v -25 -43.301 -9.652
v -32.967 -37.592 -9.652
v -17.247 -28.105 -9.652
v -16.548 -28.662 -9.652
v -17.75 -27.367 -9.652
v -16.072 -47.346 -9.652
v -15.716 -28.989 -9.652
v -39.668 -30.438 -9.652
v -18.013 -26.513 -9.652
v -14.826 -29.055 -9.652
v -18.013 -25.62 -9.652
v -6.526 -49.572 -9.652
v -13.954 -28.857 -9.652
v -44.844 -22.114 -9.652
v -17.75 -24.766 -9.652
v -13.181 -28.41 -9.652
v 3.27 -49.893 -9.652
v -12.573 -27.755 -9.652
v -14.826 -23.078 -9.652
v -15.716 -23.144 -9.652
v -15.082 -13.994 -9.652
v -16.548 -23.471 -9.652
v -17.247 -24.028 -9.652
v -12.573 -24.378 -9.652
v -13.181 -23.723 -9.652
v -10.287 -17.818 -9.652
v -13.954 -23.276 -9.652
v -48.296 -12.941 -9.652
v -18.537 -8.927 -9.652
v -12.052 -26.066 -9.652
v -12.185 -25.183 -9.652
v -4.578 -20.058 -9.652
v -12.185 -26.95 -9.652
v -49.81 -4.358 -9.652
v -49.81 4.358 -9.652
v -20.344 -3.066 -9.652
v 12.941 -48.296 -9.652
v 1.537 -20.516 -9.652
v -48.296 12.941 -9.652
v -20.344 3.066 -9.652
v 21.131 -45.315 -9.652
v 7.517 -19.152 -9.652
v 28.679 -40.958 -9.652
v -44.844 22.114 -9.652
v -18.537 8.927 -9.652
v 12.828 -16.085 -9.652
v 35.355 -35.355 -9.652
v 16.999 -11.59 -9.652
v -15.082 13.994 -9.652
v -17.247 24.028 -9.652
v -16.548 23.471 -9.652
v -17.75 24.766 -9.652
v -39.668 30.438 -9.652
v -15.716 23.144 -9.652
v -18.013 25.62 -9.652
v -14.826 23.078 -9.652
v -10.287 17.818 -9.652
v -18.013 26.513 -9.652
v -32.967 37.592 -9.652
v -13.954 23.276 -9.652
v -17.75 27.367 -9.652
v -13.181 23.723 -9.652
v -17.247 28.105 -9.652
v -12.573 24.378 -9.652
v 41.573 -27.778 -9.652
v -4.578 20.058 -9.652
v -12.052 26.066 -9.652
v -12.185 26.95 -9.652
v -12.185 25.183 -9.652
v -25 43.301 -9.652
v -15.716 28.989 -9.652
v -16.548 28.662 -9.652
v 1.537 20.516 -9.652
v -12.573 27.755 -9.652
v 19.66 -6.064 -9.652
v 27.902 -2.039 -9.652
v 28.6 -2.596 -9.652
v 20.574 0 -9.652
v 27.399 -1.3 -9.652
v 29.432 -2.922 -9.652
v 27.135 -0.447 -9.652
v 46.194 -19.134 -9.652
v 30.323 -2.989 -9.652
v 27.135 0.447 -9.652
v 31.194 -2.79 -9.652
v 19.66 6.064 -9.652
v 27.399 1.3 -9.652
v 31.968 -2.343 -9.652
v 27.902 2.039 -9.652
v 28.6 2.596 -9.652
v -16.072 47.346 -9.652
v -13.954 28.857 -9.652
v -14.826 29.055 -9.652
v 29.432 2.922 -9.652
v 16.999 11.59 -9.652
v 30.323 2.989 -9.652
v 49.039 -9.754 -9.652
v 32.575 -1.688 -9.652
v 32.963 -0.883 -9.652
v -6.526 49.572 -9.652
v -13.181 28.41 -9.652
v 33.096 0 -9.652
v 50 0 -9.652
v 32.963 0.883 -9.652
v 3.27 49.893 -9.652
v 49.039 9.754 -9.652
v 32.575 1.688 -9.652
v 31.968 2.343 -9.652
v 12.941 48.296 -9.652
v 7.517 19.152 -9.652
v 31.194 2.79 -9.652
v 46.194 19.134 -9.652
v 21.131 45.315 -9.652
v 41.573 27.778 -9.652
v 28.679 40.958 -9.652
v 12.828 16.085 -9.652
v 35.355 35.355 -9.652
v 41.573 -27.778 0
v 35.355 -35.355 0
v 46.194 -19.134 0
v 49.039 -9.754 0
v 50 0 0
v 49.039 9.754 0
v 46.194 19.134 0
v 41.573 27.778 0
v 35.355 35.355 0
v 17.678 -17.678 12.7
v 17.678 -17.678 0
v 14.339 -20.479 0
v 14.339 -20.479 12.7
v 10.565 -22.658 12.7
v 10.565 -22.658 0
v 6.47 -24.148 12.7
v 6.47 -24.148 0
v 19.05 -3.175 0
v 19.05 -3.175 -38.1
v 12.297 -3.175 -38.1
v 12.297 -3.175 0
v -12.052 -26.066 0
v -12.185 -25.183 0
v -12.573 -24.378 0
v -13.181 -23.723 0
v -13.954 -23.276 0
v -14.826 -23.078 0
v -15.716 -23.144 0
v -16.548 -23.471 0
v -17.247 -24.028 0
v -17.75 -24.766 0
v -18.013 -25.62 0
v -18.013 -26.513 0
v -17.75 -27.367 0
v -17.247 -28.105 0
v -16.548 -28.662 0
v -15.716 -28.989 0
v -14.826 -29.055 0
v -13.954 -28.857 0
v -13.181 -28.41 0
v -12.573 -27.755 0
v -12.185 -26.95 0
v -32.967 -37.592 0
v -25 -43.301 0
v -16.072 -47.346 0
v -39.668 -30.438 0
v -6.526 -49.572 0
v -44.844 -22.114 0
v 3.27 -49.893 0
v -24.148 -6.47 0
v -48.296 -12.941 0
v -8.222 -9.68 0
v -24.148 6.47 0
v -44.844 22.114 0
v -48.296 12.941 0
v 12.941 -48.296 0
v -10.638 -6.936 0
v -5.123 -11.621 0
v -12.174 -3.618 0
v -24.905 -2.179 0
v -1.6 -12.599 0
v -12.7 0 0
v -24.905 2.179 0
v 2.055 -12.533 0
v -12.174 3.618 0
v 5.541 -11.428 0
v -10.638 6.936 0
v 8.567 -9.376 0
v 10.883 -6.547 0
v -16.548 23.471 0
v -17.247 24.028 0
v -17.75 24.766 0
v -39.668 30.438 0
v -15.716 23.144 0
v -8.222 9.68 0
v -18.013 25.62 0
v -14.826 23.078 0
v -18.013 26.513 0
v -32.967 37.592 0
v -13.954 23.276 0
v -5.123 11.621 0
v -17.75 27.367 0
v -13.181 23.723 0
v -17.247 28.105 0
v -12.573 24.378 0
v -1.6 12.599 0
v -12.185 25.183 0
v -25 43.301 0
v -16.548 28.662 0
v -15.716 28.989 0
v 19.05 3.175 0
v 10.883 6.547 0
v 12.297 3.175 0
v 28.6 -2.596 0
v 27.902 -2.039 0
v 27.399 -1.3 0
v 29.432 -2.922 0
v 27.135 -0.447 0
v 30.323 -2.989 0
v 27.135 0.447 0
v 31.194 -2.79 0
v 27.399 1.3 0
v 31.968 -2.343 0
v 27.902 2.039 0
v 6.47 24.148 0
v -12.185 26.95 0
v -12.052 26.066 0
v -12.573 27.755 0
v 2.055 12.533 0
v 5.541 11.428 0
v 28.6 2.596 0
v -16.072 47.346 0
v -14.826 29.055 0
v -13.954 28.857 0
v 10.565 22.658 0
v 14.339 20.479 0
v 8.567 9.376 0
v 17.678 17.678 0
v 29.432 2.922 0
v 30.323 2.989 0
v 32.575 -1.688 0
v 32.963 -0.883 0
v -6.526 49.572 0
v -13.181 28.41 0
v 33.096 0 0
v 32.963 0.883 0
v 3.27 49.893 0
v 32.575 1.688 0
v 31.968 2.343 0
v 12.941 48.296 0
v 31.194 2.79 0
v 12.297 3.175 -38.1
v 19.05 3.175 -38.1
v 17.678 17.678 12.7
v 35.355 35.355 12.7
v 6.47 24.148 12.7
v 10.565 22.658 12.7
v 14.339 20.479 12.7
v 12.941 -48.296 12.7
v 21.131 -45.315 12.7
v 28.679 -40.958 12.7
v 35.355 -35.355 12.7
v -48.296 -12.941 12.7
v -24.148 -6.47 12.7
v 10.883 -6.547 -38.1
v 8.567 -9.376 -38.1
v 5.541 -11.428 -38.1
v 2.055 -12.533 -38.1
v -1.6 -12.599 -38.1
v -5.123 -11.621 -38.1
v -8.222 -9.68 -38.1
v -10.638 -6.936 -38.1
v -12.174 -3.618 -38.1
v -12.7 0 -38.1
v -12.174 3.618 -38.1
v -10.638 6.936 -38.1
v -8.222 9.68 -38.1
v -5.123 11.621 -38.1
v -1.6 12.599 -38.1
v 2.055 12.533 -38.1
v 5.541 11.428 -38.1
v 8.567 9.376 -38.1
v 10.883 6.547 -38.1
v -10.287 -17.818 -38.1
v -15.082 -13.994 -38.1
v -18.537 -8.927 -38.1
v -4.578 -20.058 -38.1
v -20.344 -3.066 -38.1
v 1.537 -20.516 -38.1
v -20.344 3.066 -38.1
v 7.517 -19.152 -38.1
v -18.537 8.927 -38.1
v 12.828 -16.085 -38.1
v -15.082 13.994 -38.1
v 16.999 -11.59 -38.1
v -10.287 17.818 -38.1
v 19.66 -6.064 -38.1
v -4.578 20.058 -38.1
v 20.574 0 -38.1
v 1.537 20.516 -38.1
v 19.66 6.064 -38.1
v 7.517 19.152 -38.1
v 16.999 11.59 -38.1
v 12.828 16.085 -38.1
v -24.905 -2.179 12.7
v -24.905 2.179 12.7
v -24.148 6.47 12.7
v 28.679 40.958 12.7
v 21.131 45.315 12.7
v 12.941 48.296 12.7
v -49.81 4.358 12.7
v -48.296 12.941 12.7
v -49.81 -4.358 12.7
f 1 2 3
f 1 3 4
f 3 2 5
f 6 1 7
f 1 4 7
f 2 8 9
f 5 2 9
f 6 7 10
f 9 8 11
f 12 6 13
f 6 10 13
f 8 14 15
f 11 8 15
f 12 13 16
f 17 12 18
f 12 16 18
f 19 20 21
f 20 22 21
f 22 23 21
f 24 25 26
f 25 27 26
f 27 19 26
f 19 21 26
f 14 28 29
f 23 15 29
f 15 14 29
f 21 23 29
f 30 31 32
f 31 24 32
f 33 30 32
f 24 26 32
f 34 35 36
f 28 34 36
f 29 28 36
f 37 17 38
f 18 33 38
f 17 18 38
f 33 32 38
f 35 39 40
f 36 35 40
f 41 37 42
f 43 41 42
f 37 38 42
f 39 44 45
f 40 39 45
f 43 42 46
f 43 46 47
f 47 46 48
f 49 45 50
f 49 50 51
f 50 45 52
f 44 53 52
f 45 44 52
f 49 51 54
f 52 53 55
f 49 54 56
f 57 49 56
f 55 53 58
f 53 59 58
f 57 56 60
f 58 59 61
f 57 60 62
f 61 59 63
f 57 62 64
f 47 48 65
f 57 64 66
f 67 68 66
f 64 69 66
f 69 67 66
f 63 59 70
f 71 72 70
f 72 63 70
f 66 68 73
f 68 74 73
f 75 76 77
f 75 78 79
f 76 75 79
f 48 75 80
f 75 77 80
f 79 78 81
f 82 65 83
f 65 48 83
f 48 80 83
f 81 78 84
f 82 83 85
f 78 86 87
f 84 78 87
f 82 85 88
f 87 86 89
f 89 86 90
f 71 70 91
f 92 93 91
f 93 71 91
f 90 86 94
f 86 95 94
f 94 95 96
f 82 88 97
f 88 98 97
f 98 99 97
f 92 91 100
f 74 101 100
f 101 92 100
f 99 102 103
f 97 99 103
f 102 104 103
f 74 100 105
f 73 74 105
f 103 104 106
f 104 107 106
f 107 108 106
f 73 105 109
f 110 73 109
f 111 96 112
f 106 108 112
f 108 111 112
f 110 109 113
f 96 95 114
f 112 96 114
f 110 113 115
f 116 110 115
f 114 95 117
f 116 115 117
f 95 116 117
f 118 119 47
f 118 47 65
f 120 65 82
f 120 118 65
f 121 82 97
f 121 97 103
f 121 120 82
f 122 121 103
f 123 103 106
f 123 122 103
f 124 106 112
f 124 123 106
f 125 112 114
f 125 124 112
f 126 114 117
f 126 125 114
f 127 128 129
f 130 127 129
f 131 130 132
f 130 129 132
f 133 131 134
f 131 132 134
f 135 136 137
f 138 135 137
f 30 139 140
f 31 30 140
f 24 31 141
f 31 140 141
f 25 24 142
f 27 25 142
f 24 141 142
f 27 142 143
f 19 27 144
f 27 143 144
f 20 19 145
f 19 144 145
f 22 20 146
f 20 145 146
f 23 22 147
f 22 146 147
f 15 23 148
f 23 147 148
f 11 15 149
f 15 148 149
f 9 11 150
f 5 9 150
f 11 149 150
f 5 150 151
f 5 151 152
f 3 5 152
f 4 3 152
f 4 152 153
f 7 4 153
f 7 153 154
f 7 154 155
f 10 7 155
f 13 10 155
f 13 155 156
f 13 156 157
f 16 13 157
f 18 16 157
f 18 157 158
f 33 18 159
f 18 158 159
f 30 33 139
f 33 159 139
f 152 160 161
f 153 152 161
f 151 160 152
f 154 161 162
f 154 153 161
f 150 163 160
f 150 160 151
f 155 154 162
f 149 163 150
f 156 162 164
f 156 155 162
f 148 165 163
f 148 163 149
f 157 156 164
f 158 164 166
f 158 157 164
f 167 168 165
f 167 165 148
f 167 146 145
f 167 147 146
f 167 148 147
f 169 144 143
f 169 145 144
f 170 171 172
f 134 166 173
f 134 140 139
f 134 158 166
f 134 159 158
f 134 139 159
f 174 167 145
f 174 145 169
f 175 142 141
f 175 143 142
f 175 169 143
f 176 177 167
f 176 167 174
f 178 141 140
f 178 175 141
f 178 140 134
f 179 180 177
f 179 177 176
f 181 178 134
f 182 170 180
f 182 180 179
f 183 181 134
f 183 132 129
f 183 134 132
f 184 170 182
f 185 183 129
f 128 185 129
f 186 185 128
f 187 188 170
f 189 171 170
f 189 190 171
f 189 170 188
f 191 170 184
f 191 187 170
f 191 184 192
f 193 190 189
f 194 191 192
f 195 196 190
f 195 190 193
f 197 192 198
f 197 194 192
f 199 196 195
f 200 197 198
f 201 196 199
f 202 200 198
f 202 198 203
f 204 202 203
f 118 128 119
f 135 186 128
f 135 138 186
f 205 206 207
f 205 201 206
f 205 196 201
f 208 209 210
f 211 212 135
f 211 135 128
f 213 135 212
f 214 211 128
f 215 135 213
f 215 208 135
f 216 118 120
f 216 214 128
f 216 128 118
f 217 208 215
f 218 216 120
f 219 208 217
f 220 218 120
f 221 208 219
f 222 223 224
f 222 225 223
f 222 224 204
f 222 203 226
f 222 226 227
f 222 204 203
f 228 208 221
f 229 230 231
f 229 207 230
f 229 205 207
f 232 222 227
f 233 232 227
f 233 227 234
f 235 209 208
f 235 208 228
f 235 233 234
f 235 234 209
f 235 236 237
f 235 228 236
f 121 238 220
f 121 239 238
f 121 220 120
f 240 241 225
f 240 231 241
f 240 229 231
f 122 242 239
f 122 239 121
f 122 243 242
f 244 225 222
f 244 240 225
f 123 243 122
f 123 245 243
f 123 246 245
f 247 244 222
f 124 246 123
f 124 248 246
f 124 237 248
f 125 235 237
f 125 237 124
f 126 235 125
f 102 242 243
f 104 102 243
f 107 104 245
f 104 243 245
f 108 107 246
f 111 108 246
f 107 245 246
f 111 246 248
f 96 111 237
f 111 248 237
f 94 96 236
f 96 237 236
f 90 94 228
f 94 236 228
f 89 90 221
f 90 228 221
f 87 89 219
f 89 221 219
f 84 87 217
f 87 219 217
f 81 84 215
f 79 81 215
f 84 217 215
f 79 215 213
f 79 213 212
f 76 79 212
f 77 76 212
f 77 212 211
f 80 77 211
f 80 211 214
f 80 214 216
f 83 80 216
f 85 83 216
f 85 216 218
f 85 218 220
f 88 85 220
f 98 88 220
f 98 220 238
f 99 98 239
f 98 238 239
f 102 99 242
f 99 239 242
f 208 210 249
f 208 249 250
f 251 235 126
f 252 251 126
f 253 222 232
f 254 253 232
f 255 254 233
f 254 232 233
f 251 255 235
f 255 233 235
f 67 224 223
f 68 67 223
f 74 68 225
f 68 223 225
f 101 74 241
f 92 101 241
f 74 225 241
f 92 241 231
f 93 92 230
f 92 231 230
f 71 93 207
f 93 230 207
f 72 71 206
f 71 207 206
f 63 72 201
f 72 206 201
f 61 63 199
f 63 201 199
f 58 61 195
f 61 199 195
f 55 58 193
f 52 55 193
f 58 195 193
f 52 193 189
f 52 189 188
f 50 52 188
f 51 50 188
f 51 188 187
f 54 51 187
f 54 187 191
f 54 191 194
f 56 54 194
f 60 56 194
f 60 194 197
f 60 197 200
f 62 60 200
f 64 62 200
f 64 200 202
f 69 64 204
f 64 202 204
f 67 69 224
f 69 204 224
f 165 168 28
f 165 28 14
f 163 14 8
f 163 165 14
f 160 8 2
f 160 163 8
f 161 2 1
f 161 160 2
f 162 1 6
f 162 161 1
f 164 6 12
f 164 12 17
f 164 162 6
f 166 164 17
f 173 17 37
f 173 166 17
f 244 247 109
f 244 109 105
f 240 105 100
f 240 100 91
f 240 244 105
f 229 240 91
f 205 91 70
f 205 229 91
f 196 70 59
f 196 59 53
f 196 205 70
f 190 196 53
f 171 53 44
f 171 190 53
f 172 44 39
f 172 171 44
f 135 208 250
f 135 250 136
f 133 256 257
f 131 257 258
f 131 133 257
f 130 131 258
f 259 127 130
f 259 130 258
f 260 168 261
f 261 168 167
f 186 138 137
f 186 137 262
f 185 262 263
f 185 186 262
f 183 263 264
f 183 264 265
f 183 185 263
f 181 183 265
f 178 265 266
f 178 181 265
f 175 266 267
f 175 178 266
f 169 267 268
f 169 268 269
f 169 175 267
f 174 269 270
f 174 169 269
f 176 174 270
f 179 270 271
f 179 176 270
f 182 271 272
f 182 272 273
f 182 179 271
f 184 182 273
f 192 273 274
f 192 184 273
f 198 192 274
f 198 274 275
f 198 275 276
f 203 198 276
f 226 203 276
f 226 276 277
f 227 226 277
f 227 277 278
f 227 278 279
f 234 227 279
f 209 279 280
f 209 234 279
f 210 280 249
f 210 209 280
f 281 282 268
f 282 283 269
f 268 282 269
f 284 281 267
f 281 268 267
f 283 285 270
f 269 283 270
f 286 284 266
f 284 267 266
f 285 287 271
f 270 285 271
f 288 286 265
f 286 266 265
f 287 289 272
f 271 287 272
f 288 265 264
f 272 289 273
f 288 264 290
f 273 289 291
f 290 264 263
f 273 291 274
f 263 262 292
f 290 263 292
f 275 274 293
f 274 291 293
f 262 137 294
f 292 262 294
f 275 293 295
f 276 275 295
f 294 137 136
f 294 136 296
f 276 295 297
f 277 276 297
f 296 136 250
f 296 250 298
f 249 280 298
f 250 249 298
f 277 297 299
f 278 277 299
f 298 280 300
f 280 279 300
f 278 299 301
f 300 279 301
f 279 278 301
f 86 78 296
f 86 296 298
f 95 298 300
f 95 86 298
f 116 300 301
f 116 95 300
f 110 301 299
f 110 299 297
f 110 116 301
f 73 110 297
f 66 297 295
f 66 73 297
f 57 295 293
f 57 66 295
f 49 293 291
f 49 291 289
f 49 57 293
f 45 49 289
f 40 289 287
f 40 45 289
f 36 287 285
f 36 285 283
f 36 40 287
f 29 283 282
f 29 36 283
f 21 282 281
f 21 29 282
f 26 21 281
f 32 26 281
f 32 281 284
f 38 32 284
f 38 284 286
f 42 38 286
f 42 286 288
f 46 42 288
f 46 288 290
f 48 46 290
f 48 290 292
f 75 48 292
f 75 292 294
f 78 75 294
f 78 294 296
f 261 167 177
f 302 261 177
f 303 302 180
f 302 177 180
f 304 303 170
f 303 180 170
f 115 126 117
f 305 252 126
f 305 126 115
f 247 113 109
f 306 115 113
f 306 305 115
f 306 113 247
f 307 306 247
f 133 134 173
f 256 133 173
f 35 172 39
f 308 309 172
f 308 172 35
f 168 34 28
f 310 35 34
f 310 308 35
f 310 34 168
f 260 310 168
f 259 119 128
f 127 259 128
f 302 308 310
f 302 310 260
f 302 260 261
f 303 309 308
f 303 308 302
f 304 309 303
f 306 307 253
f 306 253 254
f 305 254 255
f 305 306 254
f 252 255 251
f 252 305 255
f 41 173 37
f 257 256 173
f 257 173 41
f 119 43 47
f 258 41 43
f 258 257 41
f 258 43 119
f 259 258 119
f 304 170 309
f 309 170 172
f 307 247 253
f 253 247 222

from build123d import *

# Parameters (mm, degrees)
F1_DEPTH = 12.7
F0_R     = 2.9972
F0_R_2   = 20.574
F2_DEPTH = 9.652
F3_DEPTH = 9.652
F4_DEPTH = 38.1


with BuildPart() as f1:
    # F0 (on Top) → F1 (new body)
    with BuildSketch(Plane.XY):
        with BuildLine():
            Line((-24.1480973609, 6.4704631866), (-48.2961947219, 12.9409263732))
            ThreePointArc((-48.2961947219, 12.9409263732), (-49.9999, 0), (-48.2961947219, -12.9409263732))
            Line((-48.2961947219, -12.9409263732), (-24.1480973609, -6.4704631866))
            ThreePointArc((-24.1480973609, -6.4704631866), (-24.99995, 0), (-24.1480973609, 6.4704631866))
        make_face()
    extrude(amount=F1_DEPTH)



with BuildPart() as f1b:
    # F0 (on Top) → F1, piece 2 (new body)
    with BuildSketch(Plane.XY):
        with BuildLine():
            Line((17.6776341743, 17.6776341743), (35.3552683486, 35.3552683486))
            ThreePointArc((35.3552683486, 35.3552683486), (24.99995, 43.3011835867), (12.9409263732, 48.2961947219))
            Line((12.9409263732, 48.2961947219), (6.4704631866, 24.1480973609))
            ThreePointArc((6.4704631866, 24.1480973609), (12.499975, 21.6505917933), (17.6776341743, 17.6776341743))
        make_face()
    extrude(amount=F1_DEPTH)


with BuildPart() as f1c:
    # F0 (on Top) → F1, piece 3 (new body)
    with BuildSketch(Plane.XY):
        with BuildLine():
            ThreePointArc((12.9409263732, -48.2961947219), (24.99995, -43.3011835867), (35.3552683486, -35.3552683486))
            Line((35.3552683486, -35.3552683486), (17.6776341743, -17.6776341743))
            ThreePointArc((17.6776341743, -17.6776341743), (12.499975, -21.6505917933), (6.4704631866, -24.1480973609))
            Line((6.4704631866, -24.1480973609), (12.9409263732, -48.2961947219))
        make_face()
    extrude(amount=F1_DEPTH)


with BuildPart() as f1_1:
    add(f1.part)

    add(f1b.part)  # F2 merges F1b

    add(f1c.part)  # F2 merges F1c
    # F0 (on Top) → F2 (join)
    with BuildSketch(Plane.XY):
        with BuildLine():
            ThreePointArc((35.3552683486, -35.3552683486), (46.1938842376, -19.1341333499), (49.9999, 0))
            ThreePointArc((49.9999, 0), (46.1938842376, 19.1341333499), (35.3552683486, 35.3552683486))
            Line((35.3552683486, 35.3552683486), (17.6776341743, 17.6776341743))
            ThreePointArc((17.6776341743, 17.6776341743), (12.499975, 21.6505917933), (6.4704631866, 24.1480973609))
            Line((6.4704631866, 24.1480973609), (12.9409263732, 48.2961947219))
            ThreePointArc((12.9409263732, 48.2961947219), (-24.99995, 43.3011835867), (-48.2961947219, 12.9409263732))
            Line((-48.2961947219, 12.9409263732), (-24.1480973609, 6.4704631866))
            ThreePointArc((-24.1480973609, 6.4704631866), (-24.99995, 0), (-24.1480973609, -6.4704631866))
            Line((-24.1480973609, -6.4704631866), (-48.2961947219, -12.9409263732))
            ThreePointArc((-48.2961947219, -12.9409263732), (-24.99995, -43.3011835867), (12.9409263732, -48.2961947219))
            Line((12.9409263732, -48.2961947219), (6.4704631866, -24.1480973609))
            ThreePointArc((6.4704631866, -24.1480973609), (12.499975, -21.6505917933), (17.6776341743, -17.6776341743))
            Line((17.6776341743, -17.6776341743), (35.3552683486, -35.3552683486))
        make_face()
        with Locations((-15.0495, -26.0664986285)):
            Circle(F0_R, mode=Mode.SUBTRACT)
        with Locations((-15.0495, 26.0664986285)):
            Circle(F0_R, mode=Mode.SUBTRACT)
        Circle(F0_R_2, mode=Mode.SUBTRACT)
        with Locations((30.099, 0)):
            Circle(F0_R, mode=Mode.SUBTRACT)
        Circle(F0_R_2)
        with BuildLine():
            ThreePointArc((12.2967221242, -3.175), (-12.7, 0), (12.2967221242, 3.175))
            Line((12.2967221242, 3.175), (19.05, 3.175))
            Line((19.05, 3.175), (19.05, 0))
            Line((19.05, 0), (19.05, -3.175))
            Line((19.05, -3.175), (12.2967221242, -3.175))
        make_face(mode=Mode.SUBTRACT)
    extrude(amount=-F2_DEPTH)

    # F3 (add): faces of the model
    f3_faces = [f1_1.faces().sort_by_distance(p)[0] for p in [
        (-38.4460981424, 0, 0),
        (19.2230490712, 33.2952976677, 0),
        (19.2230490712, -33.2952976677, 0),
    ]]
    extrude(f3_faces, amount=F3_DEPTH)

    # F0 (on Top) → F4 (join)
    with BuildSketch(Plane.XY):
        Circle(F0_R_2)
        with BuildLine():
            ThreePointArc((12.2967221242, -3.175), (-12.7, 0), (12.2967221242, 3.175))
            Line((12.2967221242, 3.175), (19.05, 3.175))
            Line((19.05, 3.175), (19.05, 0))
            Line((19.05, 0), (19.05, -3.175))
            Line((19.05, -3.175), (12.2967221242, -3.175))
        make_face(mode=Mode.SUBTRACT)
    extrude(amount=-F4_DEPTH)


solid = f1_1.part
